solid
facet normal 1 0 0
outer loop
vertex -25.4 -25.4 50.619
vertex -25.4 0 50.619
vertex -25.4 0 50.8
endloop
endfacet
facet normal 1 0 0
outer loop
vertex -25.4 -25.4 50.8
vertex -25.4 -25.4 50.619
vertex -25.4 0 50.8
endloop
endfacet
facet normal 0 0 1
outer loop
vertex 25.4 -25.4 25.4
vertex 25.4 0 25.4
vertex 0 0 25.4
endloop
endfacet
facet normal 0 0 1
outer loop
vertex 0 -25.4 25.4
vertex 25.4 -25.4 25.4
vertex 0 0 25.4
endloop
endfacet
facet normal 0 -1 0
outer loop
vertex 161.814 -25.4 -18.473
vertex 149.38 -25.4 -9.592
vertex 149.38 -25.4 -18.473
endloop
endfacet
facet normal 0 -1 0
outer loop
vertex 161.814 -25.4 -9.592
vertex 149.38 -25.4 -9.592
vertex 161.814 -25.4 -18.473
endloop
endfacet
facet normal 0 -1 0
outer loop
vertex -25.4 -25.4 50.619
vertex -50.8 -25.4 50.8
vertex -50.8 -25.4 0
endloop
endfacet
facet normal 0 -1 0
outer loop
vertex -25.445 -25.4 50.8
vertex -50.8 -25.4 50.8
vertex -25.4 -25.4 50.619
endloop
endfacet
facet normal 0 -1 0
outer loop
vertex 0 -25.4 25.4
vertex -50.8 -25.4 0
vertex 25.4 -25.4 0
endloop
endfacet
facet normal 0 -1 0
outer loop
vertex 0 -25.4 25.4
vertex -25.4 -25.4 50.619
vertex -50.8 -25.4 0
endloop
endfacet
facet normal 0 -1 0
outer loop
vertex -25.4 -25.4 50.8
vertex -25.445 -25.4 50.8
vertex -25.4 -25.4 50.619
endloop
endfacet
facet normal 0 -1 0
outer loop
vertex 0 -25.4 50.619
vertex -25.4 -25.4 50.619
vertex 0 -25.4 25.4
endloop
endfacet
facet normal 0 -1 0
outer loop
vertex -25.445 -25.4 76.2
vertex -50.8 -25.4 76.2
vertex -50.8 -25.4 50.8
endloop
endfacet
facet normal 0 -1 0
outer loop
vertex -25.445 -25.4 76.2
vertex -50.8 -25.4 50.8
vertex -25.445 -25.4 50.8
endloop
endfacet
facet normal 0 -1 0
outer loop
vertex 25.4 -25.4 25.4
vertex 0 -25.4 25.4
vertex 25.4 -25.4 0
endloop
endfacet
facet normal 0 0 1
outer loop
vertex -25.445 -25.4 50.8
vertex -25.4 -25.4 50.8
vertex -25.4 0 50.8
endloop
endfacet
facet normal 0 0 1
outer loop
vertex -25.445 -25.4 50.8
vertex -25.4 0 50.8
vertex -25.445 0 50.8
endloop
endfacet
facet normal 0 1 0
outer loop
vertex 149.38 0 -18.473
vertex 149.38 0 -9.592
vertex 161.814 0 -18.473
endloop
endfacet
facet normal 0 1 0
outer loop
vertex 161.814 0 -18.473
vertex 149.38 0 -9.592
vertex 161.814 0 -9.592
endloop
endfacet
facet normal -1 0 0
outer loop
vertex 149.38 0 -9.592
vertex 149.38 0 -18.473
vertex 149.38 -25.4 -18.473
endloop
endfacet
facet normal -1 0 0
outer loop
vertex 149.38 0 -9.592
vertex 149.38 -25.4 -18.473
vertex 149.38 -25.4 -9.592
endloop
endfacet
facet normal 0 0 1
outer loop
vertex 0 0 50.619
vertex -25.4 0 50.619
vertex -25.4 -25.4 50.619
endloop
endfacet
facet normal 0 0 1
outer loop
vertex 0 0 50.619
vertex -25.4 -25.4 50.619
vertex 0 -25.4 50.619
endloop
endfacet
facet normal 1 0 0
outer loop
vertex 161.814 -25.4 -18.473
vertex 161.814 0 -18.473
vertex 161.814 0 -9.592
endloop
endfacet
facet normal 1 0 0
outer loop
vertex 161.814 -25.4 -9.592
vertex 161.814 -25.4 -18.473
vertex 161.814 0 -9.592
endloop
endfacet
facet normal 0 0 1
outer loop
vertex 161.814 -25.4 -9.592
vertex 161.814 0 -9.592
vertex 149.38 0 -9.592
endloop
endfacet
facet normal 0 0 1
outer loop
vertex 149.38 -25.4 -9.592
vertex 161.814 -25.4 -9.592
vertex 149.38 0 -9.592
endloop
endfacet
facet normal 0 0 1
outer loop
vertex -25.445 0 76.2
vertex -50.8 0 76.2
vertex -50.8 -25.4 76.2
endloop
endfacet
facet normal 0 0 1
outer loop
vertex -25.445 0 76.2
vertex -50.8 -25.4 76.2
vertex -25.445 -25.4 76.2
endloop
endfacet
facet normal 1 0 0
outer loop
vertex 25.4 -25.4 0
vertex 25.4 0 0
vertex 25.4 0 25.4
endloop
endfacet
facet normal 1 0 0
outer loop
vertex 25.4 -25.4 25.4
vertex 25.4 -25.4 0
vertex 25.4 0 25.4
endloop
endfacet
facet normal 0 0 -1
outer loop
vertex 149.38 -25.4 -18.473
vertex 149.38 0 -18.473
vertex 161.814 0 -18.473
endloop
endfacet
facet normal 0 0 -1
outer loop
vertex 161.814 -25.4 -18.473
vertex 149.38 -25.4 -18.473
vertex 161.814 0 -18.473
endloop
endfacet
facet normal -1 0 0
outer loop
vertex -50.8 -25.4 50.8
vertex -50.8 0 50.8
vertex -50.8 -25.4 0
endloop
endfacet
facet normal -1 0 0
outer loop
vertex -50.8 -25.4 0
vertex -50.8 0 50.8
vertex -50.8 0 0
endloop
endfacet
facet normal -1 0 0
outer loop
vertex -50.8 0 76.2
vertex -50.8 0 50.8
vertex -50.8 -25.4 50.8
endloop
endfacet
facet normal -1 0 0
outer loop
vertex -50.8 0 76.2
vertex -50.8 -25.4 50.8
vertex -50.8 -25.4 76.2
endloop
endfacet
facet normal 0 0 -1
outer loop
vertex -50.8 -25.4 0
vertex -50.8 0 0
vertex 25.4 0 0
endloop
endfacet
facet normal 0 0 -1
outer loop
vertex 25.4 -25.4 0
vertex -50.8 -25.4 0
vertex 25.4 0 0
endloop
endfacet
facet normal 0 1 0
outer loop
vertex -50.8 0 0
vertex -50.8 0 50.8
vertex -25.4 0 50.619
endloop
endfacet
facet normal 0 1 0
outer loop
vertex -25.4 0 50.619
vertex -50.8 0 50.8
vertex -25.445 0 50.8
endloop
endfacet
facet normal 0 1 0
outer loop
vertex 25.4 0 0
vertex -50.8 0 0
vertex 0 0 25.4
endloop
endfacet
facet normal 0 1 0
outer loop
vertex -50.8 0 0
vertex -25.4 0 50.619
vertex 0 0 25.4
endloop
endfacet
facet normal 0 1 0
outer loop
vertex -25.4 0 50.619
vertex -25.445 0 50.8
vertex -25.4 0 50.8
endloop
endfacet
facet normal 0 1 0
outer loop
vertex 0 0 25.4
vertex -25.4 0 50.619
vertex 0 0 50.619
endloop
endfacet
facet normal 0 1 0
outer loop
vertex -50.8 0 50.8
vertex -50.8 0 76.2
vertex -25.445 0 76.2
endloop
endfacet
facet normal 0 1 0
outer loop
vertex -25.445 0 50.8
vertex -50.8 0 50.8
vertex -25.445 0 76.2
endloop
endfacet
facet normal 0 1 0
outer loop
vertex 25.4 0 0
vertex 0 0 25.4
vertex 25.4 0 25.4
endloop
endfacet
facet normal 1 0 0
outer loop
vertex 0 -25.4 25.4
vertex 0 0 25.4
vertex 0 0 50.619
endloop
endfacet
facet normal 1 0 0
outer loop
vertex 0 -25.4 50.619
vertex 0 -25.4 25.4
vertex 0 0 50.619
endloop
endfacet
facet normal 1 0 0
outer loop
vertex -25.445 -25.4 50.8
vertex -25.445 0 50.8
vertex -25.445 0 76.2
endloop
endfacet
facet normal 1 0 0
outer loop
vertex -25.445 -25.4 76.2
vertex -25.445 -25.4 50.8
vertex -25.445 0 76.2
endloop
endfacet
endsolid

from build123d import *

# Parameters (mm, degrees)
F0_W     = 25.4
F0_H     = 25.4
F0_H_2   = 25.21857
F0_W_2   = 25.354643
F0_W_3   = 6.216788
F0_H_3   = 8.881118
F0_W_4   = 6.216789
F1_DEPTH = 25.4


with BuildPart() as f1:
    # F0 (on Front) → F1 (new body)
    with BuildSketch(Plane.XZ):
        with Locations((12.7, 12.7)):
            Rectangle(F0_W, F0_H)
        with Locations((-12.7, 12.7)):
            Rectangle(F0_W, F0_H)
        with Locations((-12.7, 38.009285)):
            Rectangle(F0_W, F0_H_2)
        with Locations((-38.1, 12.7)):
            Rectangle(F0_W, F0_H)
        Polygon((-50.8, 25.4), (-25.4, 25.4), (-25.4, 50.61857), (-25.4, 50.8), (-25.445357, 50.8), (-50.8, 50.8), align=None)
        with Locations((-38.122678, 63.5)):
            Rectangle(F0_W_2, F0_H)
        with Locations((152.488798, -14.032167)):
            Rectangle(F0_W_3, F0_H_3)
        with Locations((158.705586, -14.032167)):
            Rectangle(F0_W_4, F0_H_3)
    extrude(amount=F1_DEPTH)


solid = f1.part
